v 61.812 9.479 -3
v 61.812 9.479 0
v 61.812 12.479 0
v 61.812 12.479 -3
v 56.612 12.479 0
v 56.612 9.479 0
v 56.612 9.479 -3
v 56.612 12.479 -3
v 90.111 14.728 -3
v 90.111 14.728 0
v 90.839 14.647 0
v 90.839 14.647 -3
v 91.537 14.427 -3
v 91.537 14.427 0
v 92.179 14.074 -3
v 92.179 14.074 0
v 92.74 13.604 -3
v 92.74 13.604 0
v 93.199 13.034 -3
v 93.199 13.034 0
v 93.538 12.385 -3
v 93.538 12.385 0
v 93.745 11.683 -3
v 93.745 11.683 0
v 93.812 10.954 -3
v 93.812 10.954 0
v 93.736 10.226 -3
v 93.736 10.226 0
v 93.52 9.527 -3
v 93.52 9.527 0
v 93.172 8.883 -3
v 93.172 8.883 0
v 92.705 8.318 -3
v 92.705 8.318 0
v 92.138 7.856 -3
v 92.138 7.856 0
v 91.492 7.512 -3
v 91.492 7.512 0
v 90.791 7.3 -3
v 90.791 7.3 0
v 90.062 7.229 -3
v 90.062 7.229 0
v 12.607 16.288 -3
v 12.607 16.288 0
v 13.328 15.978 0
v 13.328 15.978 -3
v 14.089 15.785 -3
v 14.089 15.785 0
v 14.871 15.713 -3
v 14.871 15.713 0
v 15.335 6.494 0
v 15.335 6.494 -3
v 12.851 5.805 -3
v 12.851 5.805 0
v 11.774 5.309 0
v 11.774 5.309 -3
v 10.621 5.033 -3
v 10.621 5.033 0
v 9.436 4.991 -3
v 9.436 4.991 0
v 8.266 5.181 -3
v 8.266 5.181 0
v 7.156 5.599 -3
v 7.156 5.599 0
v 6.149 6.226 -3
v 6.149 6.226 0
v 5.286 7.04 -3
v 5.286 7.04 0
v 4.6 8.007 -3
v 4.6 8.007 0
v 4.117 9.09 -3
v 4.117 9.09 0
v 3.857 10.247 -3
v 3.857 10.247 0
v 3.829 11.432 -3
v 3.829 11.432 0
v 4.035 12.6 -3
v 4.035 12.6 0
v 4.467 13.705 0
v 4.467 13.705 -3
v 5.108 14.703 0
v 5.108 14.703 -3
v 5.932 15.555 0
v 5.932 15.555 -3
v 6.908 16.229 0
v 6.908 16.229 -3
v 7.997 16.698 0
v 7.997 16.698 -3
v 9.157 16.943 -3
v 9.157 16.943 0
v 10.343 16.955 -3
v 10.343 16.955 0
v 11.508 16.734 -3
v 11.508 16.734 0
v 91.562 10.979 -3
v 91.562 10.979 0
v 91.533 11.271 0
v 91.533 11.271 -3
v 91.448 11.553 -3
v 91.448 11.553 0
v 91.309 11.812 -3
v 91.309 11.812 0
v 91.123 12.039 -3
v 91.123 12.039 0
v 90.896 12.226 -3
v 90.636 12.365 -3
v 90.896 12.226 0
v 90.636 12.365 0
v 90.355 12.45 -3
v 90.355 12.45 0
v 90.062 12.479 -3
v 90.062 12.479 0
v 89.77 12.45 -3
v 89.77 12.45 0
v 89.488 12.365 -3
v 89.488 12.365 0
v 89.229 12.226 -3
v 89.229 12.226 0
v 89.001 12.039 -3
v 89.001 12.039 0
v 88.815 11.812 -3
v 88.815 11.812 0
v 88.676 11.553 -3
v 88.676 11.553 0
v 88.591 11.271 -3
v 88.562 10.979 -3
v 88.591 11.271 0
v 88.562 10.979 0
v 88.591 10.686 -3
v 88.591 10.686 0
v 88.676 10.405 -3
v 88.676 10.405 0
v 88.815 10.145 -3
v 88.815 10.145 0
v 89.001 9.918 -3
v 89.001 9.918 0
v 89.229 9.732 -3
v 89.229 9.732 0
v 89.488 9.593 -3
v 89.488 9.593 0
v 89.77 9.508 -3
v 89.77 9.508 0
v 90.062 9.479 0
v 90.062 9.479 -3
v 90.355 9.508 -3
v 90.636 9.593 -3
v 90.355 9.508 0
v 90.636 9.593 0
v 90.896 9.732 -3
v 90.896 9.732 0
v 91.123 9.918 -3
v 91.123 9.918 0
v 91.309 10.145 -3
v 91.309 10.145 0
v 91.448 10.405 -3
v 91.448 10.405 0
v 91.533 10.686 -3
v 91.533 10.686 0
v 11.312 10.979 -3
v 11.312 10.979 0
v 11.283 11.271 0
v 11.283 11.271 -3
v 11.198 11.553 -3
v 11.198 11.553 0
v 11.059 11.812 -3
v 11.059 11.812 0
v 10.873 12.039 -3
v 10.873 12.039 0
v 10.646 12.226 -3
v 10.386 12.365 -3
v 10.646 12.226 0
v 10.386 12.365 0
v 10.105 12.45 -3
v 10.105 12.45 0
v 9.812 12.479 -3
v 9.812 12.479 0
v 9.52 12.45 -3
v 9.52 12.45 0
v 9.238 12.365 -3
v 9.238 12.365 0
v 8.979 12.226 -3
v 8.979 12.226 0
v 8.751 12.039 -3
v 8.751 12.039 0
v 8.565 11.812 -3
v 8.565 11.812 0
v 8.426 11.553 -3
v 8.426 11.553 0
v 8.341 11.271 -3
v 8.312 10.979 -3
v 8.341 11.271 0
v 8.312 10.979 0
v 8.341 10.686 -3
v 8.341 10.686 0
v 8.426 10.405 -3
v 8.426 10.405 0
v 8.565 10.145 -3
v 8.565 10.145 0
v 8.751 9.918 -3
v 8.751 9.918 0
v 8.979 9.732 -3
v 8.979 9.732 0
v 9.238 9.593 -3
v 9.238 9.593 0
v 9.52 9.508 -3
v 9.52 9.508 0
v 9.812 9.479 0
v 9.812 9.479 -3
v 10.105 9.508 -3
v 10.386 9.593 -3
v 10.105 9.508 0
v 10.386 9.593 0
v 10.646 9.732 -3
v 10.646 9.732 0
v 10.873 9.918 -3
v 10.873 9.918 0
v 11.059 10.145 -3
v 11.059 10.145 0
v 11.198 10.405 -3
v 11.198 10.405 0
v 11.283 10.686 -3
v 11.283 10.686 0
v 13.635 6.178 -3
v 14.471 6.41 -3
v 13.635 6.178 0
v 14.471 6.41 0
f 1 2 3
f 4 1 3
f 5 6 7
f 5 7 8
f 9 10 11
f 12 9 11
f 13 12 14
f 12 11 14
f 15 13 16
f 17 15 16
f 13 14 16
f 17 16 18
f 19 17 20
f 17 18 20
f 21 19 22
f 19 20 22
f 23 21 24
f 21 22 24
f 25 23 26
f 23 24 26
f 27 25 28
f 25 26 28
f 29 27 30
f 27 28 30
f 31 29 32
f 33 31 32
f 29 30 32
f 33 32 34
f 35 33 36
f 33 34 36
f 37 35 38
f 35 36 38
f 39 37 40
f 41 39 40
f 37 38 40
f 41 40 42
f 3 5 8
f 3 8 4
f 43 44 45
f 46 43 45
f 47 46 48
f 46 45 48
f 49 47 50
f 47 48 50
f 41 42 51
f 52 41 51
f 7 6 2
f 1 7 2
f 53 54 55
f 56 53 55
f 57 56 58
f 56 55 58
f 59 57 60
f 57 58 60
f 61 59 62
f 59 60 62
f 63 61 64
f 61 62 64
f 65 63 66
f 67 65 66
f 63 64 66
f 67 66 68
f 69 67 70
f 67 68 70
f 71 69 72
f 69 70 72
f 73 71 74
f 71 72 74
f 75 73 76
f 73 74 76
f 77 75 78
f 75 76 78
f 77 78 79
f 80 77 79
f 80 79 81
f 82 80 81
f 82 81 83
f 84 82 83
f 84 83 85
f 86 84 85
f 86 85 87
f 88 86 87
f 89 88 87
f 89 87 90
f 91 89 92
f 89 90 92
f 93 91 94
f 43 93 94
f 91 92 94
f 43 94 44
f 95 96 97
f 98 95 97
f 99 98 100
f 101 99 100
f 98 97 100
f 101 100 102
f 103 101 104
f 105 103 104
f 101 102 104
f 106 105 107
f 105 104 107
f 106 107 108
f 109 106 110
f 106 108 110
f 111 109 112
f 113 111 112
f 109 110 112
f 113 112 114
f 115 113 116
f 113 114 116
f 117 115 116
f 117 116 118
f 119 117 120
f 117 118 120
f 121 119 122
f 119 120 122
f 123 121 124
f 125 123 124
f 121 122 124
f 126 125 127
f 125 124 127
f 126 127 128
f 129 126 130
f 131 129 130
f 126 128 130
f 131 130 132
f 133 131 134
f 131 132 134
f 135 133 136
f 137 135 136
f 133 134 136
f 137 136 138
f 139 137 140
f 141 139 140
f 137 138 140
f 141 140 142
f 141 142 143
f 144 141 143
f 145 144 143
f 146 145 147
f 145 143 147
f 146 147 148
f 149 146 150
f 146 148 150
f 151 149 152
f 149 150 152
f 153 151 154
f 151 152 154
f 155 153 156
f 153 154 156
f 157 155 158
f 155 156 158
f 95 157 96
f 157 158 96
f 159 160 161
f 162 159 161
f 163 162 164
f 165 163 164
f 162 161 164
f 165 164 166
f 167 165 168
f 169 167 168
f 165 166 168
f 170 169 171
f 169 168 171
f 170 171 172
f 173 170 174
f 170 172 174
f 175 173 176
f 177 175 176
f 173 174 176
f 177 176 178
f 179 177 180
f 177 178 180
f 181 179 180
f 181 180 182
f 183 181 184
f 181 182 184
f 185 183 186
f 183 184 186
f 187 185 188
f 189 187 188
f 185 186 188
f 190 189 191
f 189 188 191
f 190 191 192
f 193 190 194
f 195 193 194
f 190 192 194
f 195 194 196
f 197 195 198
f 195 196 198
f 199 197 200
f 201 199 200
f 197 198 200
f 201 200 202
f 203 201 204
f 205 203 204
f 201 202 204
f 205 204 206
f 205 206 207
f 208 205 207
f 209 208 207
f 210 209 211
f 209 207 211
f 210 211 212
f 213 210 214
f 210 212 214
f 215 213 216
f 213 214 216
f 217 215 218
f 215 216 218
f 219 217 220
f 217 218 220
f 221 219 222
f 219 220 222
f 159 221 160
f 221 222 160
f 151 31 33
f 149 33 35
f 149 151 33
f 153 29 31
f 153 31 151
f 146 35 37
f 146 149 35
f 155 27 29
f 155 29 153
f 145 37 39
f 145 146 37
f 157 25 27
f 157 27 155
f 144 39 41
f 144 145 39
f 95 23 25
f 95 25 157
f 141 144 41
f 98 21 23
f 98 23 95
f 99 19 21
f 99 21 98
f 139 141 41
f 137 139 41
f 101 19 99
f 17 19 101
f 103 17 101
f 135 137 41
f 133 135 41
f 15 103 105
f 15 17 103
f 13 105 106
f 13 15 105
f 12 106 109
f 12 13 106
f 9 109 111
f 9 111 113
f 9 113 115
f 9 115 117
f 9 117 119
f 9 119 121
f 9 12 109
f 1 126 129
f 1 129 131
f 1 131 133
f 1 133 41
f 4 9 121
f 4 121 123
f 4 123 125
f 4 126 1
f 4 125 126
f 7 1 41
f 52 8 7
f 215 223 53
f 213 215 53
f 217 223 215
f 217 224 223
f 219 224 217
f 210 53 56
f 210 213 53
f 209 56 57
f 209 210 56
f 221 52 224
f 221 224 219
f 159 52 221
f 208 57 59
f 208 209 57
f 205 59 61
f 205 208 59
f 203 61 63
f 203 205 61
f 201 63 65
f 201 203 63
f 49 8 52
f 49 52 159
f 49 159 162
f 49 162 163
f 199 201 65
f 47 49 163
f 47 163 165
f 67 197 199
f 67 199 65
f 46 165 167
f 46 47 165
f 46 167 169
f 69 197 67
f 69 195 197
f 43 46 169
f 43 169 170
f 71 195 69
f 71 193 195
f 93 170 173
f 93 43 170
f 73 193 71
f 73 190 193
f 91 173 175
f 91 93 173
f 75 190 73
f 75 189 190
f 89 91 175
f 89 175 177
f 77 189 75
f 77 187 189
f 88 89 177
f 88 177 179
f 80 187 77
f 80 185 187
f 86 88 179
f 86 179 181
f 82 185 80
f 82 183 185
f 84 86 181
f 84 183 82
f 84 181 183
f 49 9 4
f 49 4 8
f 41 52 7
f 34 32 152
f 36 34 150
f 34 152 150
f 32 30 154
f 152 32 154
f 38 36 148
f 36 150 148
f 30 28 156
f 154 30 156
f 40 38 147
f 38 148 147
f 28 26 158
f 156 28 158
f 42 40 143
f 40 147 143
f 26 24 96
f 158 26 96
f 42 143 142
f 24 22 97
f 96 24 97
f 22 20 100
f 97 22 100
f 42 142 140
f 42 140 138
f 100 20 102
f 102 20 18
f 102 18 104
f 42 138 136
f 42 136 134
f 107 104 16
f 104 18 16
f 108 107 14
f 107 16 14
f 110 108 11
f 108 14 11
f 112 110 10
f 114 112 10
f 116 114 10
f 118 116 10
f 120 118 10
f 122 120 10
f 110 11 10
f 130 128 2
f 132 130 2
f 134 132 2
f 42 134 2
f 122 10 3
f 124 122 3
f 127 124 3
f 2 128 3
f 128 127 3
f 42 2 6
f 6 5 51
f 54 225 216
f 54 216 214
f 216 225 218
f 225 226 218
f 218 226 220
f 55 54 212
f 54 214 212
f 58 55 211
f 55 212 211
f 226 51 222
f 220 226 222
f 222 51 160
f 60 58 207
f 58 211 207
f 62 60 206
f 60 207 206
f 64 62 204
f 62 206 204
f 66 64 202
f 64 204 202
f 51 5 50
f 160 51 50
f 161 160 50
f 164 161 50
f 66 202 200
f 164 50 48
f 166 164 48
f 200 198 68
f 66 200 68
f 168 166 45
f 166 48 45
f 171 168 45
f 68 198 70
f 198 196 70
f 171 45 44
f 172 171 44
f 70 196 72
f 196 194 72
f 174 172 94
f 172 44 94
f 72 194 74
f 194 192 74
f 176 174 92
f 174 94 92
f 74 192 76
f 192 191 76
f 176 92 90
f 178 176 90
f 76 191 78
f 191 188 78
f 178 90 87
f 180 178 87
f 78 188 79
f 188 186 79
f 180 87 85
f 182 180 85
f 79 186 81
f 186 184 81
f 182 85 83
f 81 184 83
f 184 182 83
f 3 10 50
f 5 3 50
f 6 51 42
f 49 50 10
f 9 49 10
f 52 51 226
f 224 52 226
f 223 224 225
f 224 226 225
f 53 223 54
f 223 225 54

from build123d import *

# Parameters (mm, degrees)
ESQUISSE1_R               = 1.5
ESQUISSE1_W               = 5.2
ESQUISSE1_H               = 3
T_LE_DE_BASE_PLI_E1_DEPTH = 3


# Sheet-metal steps are written as plain solids
with BuildPart() as part:
    # Esquisse1 → Tôle de base pliée1 (new body)
    with BuildSketch(Plane.XY):
        with BuildLine():
            Line((14.870524532, 15.712944318), (90.111215477, 14.728402402))
            ThreePointArc((90.111215477, 14.728402402), (93.812069805, 10.954190169), (90.062150056, 7.228723404))
            Line((90.062150056, 7.228723404), (15.334764804, 6.494002243))
            ThreePointArc((15.334764804, 6.494002243), (14.047901461, 6.312443531), (12.851298677, 5.805370946))
            ThreePointArc((12.851298677, 5.805370946), (3.813779457, 10.83890154), (12.606947349, 16.288064992))
            ThreePointArc((12.606947349, 16.288064992), (13.70468529, 15.866487084), (14.870524532, 15.712944318))
        make_face()
        with Locations((9.812150056, 10.978723404)):
            Circle(ESQUISSE1_R, mode=Mode.SUBTRACT)
        with Locations((90.062150056, 10.978723404)):
            Circle(ESQUISSE1_R, mode=Mode.SUBTRACT)
        with Locations((59.212150056, 10.978723404)):
            Rectangle(ESQUISSE1_W, ESQUISSE1_H, mode=Mode.SUBTRACT)
    extrude(amount=-T_LE_DE_BASE_PLI_E1_DEPTH)


solid = part.part
